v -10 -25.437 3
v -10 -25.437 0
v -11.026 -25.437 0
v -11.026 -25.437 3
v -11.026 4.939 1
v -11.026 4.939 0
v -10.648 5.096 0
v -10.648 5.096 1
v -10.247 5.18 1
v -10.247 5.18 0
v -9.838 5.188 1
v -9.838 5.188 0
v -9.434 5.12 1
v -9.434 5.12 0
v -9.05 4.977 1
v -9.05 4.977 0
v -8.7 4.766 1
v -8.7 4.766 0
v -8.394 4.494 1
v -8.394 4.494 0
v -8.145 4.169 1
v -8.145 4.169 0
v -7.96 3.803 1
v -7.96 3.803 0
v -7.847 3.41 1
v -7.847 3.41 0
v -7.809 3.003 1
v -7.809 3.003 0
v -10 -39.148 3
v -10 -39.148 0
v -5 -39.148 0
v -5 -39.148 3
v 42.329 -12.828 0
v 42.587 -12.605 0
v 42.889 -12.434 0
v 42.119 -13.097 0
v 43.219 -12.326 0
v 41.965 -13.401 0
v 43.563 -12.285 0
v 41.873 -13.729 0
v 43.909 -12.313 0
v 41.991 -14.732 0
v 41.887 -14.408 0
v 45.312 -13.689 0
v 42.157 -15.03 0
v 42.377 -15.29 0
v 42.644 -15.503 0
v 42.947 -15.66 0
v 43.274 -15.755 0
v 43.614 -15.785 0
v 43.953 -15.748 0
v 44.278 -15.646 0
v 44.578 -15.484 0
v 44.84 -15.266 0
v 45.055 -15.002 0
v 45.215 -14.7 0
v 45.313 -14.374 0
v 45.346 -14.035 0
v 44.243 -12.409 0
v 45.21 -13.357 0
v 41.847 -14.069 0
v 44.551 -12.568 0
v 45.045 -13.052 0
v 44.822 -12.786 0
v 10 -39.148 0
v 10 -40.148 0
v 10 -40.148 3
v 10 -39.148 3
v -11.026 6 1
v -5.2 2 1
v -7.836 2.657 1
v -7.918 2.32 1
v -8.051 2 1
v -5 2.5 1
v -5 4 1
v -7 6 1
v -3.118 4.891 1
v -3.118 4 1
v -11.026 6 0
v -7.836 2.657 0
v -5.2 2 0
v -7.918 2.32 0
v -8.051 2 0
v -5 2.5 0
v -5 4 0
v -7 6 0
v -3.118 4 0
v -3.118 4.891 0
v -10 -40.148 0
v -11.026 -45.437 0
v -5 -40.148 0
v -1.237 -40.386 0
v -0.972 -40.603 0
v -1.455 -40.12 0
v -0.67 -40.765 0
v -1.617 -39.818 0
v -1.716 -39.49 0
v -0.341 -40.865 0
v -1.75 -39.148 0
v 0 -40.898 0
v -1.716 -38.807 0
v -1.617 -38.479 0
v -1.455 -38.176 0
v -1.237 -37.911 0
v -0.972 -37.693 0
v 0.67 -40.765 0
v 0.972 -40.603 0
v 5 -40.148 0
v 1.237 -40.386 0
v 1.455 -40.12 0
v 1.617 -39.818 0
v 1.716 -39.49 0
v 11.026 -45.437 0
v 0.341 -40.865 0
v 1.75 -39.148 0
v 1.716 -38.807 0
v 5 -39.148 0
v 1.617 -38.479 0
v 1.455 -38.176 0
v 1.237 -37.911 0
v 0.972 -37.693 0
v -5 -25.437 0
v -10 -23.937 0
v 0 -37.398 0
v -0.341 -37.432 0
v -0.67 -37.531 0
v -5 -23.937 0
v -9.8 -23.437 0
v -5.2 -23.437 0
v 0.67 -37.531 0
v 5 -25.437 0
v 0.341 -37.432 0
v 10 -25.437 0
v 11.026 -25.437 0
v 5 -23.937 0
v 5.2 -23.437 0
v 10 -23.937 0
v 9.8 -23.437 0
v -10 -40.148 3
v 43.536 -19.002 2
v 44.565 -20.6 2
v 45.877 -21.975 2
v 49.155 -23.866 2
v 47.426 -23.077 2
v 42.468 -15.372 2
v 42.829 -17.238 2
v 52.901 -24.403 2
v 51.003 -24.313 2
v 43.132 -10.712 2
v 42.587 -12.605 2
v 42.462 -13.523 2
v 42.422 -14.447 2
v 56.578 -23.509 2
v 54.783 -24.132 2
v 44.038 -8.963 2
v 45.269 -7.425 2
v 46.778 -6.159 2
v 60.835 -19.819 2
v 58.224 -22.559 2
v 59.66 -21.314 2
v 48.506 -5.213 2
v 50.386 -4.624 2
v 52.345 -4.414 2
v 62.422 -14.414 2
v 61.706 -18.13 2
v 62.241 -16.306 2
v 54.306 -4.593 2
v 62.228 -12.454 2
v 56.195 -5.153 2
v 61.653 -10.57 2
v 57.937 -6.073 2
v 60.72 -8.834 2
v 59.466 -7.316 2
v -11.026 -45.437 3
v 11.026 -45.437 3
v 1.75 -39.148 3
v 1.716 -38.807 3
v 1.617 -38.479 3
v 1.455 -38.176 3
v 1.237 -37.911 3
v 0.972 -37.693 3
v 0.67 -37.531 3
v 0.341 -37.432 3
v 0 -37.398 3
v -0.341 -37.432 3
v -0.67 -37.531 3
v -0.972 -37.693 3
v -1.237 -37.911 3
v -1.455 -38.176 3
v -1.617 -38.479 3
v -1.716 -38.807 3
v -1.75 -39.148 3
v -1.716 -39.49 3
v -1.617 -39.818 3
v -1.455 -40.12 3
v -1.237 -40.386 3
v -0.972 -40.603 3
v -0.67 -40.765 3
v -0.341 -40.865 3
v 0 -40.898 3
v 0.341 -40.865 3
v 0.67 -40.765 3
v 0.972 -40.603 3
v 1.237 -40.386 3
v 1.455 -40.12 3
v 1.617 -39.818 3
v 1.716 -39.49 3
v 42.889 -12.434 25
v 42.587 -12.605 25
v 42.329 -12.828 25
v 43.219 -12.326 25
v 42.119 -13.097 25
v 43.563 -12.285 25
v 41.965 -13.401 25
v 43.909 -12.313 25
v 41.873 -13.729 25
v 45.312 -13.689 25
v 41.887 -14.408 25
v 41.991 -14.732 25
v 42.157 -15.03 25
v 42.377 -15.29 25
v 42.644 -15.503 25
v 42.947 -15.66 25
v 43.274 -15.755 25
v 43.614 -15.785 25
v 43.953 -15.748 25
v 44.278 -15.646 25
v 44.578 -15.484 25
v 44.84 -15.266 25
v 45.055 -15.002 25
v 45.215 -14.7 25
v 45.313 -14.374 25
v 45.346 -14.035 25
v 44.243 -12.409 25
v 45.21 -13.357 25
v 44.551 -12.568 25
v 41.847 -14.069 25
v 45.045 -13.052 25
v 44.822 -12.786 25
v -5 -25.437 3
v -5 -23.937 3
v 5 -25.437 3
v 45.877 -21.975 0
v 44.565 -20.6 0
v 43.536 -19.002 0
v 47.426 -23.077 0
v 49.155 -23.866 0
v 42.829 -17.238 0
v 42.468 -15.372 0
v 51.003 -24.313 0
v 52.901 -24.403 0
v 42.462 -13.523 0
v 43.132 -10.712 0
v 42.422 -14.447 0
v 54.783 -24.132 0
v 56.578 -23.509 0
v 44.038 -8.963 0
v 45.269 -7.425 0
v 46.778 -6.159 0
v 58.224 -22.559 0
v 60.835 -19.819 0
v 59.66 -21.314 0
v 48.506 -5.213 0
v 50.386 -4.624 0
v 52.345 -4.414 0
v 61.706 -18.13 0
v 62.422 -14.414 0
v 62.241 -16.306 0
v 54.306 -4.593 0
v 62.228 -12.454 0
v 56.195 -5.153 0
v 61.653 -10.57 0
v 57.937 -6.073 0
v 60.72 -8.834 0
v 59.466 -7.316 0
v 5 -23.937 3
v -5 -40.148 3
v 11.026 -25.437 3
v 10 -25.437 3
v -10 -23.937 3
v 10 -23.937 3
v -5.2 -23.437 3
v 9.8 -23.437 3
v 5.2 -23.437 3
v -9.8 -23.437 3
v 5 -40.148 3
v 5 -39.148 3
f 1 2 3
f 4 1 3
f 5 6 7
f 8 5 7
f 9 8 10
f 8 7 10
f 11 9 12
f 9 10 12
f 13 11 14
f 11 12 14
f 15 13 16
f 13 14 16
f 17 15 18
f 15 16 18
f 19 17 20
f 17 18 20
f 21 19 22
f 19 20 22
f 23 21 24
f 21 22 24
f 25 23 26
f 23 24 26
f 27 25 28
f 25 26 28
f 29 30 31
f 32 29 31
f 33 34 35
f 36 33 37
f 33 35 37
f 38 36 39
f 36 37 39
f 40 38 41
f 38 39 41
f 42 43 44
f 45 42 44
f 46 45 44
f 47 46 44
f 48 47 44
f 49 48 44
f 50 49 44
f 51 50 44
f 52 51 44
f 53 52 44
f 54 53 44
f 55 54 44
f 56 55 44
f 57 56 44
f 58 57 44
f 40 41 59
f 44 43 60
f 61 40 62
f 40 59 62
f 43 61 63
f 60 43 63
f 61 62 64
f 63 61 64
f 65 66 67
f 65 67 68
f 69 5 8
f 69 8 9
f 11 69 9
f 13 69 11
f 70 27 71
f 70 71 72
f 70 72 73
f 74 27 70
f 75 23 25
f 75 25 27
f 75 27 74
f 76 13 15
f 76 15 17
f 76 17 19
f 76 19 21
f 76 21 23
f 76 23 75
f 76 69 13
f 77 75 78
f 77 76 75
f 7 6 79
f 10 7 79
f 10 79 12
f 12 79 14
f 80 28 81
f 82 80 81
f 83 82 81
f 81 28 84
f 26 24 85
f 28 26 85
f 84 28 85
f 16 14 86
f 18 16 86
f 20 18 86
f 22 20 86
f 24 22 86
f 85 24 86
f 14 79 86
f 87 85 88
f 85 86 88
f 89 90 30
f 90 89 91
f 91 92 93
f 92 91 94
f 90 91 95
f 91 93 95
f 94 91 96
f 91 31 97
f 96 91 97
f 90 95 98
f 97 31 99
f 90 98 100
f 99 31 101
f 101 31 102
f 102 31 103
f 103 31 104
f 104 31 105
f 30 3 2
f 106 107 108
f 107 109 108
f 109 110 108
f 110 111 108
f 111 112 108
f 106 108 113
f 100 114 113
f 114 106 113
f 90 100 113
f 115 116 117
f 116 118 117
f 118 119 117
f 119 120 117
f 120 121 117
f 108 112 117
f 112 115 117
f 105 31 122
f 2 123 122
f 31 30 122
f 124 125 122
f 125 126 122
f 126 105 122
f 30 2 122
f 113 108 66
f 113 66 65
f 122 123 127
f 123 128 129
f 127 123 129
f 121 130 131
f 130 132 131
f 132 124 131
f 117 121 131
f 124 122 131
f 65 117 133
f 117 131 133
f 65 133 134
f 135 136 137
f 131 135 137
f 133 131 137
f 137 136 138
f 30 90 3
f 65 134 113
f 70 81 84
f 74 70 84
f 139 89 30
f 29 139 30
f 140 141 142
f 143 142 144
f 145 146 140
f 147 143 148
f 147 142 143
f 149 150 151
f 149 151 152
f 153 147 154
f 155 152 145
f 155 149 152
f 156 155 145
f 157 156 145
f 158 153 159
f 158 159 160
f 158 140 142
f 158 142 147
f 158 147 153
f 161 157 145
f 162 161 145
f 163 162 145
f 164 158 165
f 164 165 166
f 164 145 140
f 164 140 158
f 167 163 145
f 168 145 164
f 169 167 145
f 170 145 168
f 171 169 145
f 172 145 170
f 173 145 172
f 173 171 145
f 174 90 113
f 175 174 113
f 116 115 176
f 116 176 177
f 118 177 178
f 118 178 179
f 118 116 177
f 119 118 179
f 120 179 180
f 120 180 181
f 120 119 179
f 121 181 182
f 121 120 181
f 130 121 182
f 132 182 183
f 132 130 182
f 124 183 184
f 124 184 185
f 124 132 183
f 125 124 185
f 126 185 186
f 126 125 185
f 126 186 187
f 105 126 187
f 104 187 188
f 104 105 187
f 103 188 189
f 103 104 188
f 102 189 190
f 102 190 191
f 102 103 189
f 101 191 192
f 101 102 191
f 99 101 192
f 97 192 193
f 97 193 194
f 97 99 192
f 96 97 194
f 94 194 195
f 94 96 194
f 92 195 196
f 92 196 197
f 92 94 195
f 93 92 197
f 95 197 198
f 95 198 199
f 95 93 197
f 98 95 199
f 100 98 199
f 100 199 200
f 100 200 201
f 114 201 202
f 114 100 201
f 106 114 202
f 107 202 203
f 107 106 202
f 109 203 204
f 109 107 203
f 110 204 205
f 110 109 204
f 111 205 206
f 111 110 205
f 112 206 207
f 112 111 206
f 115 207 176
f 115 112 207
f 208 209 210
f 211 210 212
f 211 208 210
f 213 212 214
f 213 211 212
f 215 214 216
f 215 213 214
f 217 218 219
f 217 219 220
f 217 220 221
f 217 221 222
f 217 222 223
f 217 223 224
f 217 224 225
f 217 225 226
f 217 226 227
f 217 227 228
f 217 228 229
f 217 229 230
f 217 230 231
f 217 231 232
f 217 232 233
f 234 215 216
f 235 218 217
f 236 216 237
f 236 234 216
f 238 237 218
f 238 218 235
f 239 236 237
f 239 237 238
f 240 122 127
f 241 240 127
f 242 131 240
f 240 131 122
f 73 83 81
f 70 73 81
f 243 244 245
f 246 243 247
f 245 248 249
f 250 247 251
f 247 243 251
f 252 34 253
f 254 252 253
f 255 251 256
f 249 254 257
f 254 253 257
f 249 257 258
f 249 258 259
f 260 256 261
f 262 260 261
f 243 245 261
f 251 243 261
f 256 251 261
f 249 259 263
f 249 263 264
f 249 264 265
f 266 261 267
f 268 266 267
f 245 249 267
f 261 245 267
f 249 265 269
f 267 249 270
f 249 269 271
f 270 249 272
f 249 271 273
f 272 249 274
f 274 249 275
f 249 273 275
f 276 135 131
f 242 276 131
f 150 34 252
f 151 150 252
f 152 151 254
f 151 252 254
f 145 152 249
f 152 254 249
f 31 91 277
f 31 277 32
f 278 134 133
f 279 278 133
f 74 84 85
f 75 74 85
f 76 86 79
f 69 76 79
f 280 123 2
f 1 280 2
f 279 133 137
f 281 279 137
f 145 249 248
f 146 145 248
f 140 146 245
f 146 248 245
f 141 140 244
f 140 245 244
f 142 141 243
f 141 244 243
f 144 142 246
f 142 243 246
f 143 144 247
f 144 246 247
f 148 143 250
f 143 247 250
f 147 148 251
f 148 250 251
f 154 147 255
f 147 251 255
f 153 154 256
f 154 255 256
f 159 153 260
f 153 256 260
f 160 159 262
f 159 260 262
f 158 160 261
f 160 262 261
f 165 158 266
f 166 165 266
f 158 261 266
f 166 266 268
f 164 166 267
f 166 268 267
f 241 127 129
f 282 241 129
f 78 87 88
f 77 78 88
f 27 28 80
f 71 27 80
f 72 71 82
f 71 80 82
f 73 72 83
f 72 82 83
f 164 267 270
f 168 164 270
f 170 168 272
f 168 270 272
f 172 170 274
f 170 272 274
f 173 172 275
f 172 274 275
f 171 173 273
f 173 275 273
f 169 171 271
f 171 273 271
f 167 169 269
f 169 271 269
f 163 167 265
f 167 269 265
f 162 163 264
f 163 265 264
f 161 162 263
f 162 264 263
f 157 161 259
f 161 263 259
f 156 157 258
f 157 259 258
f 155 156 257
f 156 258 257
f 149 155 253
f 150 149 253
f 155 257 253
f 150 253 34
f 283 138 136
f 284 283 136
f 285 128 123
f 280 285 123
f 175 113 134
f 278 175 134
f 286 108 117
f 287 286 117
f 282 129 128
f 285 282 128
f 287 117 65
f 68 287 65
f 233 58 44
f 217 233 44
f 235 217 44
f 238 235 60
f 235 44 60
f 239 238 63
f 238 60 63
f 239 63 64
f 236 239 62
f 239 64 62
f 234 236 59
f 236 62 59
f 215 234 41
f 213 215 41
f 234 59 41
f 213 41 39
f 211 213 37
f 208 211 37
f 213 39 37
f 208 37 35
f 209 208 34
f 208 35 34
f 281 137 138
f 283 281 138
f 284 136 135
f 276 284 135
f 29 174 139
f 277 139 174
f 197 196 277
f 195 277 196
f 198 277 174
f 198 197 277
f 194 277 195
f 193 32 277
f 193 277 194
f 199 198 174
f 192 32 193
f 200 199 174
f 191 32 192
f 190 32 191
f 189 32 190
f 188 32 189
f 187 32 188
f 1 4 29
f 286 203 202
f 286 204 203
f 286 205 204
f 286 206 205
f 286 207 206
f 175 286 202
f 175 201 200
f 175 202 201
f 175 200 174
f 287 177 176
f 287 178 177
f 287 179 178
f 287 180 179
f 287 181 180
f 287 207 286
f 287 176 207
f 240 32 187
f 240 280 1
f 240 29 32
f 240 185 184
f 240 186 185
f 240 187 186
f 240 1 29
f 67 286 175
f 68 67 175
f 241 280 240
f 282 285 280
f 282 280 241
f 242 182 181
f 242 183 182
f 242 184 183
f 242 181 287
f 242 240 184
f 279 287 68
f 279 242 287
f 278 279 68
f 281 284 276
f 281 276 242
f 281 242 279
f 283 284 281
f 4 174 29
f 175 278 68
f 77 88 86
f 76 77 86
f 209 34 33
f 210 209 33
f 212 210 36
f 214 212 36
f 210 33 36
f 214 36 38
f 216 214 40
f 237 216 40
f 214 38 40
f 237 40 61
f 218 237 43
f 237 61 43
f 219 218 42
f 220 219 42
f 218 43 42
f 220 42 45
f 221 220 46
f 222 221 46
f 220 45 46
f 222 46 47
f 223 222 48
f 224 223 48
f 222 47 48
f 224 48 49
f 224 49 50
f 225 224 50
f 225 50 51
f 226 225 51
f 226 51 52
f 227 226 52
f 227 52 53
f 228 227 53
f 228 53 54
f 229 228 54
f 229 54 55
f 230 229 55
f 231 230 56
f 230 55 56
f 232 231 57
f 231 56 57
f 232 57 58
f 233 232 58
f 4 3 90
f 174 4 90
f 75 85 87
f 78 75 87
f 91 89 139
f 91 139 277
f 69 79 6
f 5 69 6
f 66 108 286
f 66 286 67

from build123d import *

# Parameters (mm, degrees)
F3_DEPTH = 1
F2_W     = 5
F2_H     = 1
F2_R     = 1.75
F4_DEPTH = 3
F5_DEPTH = 2
F6_DEPTH = 25


with BuildPart() as f3:
    # F2 (on Top) → F3 (new body)
    with BuildSketch(Plane.XY):
        with BuildLine():
            Line((-11.0257832855, 6), (-11.0257832855, 4.9389316823))
            ThreePointArc((-11.0257832855, 4.9389316823), (-8.8699336118, 4.8799841901), (-7.808669225, 3.0025176727))
            ThreePointArc((-7.808669225, 3.0025176727), (-7.8702263455, 2.4867708881), (-8.0514392795, 2))
            Line((-8.0514392795, 2), (-5.2, 2))
            Line((-5.2, 2), (-5, 2.5))
            Line((-5, 2.5), (-5, 4))
            Line((-5, 4), (-3.1179972207, 4))
            Line((-3.1179972207, 4), (-3.1179972207, 4.8908563488))
            Line((-3.1179972207, 4.8908563488), (-7, 6))
            Line((-7, 6), (-11.0257832855, 6))
        make_face()
    extrude(amount=F3_DEPTH)


with BuildPart() as f4:
    # F2 (on Top) → F4 (new body)
    with BuildSketch(Plane.XY):
        Polygon((-5, -25.4367285371), (-5, -23.9367285371), (-5.2, -23.4367285371), (-9.8, -23.4367285371), (-10, -23.9367285371), (-10, -25.4367285371), (-11.0257832855, -25.4367285371), (-11.0257832855, -45.4367285371), (0, -45.4367285371), (11.0257832855, -45.4367285371), (11.0257832855, -25.4367285371), (10, -25.4367285371), (10, -23.9367285371), (9.8, -23.4367285371), (5.2, -23.4367285371), (5, -23.9367285371), (5, -25.4367285371), (0, -25.4367285371), align=None)
        with Locations((-7.5, -39.6482457221)):
            Rectangle(F2_W, F2_H, mode=Mode.SUBTRACT)
        with Locations((0, -39.1482457221)):
            Circle(F2_R, mode=Mode.SUBTRACT)
        with Locations((7.5, -39.6482457221)):
            Rectangle(F2_W, F2_H, mode=Mode.SUBTRACT)
    extrude(amount=F4_DEPTH)


with BuildPart() as f5:
    # F2 (on Top) → F5 (new body)
    with BuildSketch(Plane.XY):
        with BuildLine():
            ThreePointArc((45.3464222997, -14.0346676926), (44.4012885239, -12.4807402937), (42.5867761726, -12.6052920604))
            ThreePointArc((42.5867761726, -12.6052920604), (42.431044583, -13.9845533947), (42.4677965185, -15.3720920254))
            ThreePointArc((42.4677965185, -15.3720920254), (44.3337841115, -15.6217397006), (45.3464222997, -14.0346676926))
        make_face()
        with BuildLine():
            ThreePointArc((42.4677965185, -15.3720920254), (52.9013175639, -24.402679631), (62.4218112592, -14.4141825616))
            ThreePointArc((62.4218112592, -14.4141825616), (53.3300097877, -4.4555091845), (42.5867761726, -12.6052920604))
            ThreePointArc((42.5867761726, -12.6052920604), (44.4012885239, -12.4807402937), (45.3464222997, -14.0346676926))
            ThreePointArc((45.3464222997, -14.0346676926), (44.3337841115, -15.6217397006), (42.4677965185, -15.3720920254))
        make_face()
    extrude(amount=F5_DEPTH)


with BuildPart() as f6:
    # F2 (on Top) → F6 (new body)
    with BuildSketch(Plane.XY):
        with BuildLine():
            ThreePointArc((42.4677965185, -15.3720920254), (42.431044583, -13.9845533947), (42.5867761726, -12.6052920604))
            ThreePointArc((42.5867761726, -12.6052920604), (41.8480381314, -13.9594825884), (42.4677965185, -15.3720920254))
        make_face()
        with BuildLine():
            ThreePointArc((45.3464222997, -14.0346676926), (44.4012885239, -12.4807402937), (42.5867761726, -12.6052920604))
            ThreePointArc((42.5867761726, -12.6052920604), (42.431044583, -13.9845533947), (42.4677965185, -15.3720920254))
            ThreePointArc((42.4677965185, -15.3720920254), (44.3337841115, -15.6217397006), (45.3464222997, -14.0346676926))
        make_face()
    extrude(amount=F6_DEPTH)


solid = Compound([f3.part, f4.part, f5.part, f6.part])
